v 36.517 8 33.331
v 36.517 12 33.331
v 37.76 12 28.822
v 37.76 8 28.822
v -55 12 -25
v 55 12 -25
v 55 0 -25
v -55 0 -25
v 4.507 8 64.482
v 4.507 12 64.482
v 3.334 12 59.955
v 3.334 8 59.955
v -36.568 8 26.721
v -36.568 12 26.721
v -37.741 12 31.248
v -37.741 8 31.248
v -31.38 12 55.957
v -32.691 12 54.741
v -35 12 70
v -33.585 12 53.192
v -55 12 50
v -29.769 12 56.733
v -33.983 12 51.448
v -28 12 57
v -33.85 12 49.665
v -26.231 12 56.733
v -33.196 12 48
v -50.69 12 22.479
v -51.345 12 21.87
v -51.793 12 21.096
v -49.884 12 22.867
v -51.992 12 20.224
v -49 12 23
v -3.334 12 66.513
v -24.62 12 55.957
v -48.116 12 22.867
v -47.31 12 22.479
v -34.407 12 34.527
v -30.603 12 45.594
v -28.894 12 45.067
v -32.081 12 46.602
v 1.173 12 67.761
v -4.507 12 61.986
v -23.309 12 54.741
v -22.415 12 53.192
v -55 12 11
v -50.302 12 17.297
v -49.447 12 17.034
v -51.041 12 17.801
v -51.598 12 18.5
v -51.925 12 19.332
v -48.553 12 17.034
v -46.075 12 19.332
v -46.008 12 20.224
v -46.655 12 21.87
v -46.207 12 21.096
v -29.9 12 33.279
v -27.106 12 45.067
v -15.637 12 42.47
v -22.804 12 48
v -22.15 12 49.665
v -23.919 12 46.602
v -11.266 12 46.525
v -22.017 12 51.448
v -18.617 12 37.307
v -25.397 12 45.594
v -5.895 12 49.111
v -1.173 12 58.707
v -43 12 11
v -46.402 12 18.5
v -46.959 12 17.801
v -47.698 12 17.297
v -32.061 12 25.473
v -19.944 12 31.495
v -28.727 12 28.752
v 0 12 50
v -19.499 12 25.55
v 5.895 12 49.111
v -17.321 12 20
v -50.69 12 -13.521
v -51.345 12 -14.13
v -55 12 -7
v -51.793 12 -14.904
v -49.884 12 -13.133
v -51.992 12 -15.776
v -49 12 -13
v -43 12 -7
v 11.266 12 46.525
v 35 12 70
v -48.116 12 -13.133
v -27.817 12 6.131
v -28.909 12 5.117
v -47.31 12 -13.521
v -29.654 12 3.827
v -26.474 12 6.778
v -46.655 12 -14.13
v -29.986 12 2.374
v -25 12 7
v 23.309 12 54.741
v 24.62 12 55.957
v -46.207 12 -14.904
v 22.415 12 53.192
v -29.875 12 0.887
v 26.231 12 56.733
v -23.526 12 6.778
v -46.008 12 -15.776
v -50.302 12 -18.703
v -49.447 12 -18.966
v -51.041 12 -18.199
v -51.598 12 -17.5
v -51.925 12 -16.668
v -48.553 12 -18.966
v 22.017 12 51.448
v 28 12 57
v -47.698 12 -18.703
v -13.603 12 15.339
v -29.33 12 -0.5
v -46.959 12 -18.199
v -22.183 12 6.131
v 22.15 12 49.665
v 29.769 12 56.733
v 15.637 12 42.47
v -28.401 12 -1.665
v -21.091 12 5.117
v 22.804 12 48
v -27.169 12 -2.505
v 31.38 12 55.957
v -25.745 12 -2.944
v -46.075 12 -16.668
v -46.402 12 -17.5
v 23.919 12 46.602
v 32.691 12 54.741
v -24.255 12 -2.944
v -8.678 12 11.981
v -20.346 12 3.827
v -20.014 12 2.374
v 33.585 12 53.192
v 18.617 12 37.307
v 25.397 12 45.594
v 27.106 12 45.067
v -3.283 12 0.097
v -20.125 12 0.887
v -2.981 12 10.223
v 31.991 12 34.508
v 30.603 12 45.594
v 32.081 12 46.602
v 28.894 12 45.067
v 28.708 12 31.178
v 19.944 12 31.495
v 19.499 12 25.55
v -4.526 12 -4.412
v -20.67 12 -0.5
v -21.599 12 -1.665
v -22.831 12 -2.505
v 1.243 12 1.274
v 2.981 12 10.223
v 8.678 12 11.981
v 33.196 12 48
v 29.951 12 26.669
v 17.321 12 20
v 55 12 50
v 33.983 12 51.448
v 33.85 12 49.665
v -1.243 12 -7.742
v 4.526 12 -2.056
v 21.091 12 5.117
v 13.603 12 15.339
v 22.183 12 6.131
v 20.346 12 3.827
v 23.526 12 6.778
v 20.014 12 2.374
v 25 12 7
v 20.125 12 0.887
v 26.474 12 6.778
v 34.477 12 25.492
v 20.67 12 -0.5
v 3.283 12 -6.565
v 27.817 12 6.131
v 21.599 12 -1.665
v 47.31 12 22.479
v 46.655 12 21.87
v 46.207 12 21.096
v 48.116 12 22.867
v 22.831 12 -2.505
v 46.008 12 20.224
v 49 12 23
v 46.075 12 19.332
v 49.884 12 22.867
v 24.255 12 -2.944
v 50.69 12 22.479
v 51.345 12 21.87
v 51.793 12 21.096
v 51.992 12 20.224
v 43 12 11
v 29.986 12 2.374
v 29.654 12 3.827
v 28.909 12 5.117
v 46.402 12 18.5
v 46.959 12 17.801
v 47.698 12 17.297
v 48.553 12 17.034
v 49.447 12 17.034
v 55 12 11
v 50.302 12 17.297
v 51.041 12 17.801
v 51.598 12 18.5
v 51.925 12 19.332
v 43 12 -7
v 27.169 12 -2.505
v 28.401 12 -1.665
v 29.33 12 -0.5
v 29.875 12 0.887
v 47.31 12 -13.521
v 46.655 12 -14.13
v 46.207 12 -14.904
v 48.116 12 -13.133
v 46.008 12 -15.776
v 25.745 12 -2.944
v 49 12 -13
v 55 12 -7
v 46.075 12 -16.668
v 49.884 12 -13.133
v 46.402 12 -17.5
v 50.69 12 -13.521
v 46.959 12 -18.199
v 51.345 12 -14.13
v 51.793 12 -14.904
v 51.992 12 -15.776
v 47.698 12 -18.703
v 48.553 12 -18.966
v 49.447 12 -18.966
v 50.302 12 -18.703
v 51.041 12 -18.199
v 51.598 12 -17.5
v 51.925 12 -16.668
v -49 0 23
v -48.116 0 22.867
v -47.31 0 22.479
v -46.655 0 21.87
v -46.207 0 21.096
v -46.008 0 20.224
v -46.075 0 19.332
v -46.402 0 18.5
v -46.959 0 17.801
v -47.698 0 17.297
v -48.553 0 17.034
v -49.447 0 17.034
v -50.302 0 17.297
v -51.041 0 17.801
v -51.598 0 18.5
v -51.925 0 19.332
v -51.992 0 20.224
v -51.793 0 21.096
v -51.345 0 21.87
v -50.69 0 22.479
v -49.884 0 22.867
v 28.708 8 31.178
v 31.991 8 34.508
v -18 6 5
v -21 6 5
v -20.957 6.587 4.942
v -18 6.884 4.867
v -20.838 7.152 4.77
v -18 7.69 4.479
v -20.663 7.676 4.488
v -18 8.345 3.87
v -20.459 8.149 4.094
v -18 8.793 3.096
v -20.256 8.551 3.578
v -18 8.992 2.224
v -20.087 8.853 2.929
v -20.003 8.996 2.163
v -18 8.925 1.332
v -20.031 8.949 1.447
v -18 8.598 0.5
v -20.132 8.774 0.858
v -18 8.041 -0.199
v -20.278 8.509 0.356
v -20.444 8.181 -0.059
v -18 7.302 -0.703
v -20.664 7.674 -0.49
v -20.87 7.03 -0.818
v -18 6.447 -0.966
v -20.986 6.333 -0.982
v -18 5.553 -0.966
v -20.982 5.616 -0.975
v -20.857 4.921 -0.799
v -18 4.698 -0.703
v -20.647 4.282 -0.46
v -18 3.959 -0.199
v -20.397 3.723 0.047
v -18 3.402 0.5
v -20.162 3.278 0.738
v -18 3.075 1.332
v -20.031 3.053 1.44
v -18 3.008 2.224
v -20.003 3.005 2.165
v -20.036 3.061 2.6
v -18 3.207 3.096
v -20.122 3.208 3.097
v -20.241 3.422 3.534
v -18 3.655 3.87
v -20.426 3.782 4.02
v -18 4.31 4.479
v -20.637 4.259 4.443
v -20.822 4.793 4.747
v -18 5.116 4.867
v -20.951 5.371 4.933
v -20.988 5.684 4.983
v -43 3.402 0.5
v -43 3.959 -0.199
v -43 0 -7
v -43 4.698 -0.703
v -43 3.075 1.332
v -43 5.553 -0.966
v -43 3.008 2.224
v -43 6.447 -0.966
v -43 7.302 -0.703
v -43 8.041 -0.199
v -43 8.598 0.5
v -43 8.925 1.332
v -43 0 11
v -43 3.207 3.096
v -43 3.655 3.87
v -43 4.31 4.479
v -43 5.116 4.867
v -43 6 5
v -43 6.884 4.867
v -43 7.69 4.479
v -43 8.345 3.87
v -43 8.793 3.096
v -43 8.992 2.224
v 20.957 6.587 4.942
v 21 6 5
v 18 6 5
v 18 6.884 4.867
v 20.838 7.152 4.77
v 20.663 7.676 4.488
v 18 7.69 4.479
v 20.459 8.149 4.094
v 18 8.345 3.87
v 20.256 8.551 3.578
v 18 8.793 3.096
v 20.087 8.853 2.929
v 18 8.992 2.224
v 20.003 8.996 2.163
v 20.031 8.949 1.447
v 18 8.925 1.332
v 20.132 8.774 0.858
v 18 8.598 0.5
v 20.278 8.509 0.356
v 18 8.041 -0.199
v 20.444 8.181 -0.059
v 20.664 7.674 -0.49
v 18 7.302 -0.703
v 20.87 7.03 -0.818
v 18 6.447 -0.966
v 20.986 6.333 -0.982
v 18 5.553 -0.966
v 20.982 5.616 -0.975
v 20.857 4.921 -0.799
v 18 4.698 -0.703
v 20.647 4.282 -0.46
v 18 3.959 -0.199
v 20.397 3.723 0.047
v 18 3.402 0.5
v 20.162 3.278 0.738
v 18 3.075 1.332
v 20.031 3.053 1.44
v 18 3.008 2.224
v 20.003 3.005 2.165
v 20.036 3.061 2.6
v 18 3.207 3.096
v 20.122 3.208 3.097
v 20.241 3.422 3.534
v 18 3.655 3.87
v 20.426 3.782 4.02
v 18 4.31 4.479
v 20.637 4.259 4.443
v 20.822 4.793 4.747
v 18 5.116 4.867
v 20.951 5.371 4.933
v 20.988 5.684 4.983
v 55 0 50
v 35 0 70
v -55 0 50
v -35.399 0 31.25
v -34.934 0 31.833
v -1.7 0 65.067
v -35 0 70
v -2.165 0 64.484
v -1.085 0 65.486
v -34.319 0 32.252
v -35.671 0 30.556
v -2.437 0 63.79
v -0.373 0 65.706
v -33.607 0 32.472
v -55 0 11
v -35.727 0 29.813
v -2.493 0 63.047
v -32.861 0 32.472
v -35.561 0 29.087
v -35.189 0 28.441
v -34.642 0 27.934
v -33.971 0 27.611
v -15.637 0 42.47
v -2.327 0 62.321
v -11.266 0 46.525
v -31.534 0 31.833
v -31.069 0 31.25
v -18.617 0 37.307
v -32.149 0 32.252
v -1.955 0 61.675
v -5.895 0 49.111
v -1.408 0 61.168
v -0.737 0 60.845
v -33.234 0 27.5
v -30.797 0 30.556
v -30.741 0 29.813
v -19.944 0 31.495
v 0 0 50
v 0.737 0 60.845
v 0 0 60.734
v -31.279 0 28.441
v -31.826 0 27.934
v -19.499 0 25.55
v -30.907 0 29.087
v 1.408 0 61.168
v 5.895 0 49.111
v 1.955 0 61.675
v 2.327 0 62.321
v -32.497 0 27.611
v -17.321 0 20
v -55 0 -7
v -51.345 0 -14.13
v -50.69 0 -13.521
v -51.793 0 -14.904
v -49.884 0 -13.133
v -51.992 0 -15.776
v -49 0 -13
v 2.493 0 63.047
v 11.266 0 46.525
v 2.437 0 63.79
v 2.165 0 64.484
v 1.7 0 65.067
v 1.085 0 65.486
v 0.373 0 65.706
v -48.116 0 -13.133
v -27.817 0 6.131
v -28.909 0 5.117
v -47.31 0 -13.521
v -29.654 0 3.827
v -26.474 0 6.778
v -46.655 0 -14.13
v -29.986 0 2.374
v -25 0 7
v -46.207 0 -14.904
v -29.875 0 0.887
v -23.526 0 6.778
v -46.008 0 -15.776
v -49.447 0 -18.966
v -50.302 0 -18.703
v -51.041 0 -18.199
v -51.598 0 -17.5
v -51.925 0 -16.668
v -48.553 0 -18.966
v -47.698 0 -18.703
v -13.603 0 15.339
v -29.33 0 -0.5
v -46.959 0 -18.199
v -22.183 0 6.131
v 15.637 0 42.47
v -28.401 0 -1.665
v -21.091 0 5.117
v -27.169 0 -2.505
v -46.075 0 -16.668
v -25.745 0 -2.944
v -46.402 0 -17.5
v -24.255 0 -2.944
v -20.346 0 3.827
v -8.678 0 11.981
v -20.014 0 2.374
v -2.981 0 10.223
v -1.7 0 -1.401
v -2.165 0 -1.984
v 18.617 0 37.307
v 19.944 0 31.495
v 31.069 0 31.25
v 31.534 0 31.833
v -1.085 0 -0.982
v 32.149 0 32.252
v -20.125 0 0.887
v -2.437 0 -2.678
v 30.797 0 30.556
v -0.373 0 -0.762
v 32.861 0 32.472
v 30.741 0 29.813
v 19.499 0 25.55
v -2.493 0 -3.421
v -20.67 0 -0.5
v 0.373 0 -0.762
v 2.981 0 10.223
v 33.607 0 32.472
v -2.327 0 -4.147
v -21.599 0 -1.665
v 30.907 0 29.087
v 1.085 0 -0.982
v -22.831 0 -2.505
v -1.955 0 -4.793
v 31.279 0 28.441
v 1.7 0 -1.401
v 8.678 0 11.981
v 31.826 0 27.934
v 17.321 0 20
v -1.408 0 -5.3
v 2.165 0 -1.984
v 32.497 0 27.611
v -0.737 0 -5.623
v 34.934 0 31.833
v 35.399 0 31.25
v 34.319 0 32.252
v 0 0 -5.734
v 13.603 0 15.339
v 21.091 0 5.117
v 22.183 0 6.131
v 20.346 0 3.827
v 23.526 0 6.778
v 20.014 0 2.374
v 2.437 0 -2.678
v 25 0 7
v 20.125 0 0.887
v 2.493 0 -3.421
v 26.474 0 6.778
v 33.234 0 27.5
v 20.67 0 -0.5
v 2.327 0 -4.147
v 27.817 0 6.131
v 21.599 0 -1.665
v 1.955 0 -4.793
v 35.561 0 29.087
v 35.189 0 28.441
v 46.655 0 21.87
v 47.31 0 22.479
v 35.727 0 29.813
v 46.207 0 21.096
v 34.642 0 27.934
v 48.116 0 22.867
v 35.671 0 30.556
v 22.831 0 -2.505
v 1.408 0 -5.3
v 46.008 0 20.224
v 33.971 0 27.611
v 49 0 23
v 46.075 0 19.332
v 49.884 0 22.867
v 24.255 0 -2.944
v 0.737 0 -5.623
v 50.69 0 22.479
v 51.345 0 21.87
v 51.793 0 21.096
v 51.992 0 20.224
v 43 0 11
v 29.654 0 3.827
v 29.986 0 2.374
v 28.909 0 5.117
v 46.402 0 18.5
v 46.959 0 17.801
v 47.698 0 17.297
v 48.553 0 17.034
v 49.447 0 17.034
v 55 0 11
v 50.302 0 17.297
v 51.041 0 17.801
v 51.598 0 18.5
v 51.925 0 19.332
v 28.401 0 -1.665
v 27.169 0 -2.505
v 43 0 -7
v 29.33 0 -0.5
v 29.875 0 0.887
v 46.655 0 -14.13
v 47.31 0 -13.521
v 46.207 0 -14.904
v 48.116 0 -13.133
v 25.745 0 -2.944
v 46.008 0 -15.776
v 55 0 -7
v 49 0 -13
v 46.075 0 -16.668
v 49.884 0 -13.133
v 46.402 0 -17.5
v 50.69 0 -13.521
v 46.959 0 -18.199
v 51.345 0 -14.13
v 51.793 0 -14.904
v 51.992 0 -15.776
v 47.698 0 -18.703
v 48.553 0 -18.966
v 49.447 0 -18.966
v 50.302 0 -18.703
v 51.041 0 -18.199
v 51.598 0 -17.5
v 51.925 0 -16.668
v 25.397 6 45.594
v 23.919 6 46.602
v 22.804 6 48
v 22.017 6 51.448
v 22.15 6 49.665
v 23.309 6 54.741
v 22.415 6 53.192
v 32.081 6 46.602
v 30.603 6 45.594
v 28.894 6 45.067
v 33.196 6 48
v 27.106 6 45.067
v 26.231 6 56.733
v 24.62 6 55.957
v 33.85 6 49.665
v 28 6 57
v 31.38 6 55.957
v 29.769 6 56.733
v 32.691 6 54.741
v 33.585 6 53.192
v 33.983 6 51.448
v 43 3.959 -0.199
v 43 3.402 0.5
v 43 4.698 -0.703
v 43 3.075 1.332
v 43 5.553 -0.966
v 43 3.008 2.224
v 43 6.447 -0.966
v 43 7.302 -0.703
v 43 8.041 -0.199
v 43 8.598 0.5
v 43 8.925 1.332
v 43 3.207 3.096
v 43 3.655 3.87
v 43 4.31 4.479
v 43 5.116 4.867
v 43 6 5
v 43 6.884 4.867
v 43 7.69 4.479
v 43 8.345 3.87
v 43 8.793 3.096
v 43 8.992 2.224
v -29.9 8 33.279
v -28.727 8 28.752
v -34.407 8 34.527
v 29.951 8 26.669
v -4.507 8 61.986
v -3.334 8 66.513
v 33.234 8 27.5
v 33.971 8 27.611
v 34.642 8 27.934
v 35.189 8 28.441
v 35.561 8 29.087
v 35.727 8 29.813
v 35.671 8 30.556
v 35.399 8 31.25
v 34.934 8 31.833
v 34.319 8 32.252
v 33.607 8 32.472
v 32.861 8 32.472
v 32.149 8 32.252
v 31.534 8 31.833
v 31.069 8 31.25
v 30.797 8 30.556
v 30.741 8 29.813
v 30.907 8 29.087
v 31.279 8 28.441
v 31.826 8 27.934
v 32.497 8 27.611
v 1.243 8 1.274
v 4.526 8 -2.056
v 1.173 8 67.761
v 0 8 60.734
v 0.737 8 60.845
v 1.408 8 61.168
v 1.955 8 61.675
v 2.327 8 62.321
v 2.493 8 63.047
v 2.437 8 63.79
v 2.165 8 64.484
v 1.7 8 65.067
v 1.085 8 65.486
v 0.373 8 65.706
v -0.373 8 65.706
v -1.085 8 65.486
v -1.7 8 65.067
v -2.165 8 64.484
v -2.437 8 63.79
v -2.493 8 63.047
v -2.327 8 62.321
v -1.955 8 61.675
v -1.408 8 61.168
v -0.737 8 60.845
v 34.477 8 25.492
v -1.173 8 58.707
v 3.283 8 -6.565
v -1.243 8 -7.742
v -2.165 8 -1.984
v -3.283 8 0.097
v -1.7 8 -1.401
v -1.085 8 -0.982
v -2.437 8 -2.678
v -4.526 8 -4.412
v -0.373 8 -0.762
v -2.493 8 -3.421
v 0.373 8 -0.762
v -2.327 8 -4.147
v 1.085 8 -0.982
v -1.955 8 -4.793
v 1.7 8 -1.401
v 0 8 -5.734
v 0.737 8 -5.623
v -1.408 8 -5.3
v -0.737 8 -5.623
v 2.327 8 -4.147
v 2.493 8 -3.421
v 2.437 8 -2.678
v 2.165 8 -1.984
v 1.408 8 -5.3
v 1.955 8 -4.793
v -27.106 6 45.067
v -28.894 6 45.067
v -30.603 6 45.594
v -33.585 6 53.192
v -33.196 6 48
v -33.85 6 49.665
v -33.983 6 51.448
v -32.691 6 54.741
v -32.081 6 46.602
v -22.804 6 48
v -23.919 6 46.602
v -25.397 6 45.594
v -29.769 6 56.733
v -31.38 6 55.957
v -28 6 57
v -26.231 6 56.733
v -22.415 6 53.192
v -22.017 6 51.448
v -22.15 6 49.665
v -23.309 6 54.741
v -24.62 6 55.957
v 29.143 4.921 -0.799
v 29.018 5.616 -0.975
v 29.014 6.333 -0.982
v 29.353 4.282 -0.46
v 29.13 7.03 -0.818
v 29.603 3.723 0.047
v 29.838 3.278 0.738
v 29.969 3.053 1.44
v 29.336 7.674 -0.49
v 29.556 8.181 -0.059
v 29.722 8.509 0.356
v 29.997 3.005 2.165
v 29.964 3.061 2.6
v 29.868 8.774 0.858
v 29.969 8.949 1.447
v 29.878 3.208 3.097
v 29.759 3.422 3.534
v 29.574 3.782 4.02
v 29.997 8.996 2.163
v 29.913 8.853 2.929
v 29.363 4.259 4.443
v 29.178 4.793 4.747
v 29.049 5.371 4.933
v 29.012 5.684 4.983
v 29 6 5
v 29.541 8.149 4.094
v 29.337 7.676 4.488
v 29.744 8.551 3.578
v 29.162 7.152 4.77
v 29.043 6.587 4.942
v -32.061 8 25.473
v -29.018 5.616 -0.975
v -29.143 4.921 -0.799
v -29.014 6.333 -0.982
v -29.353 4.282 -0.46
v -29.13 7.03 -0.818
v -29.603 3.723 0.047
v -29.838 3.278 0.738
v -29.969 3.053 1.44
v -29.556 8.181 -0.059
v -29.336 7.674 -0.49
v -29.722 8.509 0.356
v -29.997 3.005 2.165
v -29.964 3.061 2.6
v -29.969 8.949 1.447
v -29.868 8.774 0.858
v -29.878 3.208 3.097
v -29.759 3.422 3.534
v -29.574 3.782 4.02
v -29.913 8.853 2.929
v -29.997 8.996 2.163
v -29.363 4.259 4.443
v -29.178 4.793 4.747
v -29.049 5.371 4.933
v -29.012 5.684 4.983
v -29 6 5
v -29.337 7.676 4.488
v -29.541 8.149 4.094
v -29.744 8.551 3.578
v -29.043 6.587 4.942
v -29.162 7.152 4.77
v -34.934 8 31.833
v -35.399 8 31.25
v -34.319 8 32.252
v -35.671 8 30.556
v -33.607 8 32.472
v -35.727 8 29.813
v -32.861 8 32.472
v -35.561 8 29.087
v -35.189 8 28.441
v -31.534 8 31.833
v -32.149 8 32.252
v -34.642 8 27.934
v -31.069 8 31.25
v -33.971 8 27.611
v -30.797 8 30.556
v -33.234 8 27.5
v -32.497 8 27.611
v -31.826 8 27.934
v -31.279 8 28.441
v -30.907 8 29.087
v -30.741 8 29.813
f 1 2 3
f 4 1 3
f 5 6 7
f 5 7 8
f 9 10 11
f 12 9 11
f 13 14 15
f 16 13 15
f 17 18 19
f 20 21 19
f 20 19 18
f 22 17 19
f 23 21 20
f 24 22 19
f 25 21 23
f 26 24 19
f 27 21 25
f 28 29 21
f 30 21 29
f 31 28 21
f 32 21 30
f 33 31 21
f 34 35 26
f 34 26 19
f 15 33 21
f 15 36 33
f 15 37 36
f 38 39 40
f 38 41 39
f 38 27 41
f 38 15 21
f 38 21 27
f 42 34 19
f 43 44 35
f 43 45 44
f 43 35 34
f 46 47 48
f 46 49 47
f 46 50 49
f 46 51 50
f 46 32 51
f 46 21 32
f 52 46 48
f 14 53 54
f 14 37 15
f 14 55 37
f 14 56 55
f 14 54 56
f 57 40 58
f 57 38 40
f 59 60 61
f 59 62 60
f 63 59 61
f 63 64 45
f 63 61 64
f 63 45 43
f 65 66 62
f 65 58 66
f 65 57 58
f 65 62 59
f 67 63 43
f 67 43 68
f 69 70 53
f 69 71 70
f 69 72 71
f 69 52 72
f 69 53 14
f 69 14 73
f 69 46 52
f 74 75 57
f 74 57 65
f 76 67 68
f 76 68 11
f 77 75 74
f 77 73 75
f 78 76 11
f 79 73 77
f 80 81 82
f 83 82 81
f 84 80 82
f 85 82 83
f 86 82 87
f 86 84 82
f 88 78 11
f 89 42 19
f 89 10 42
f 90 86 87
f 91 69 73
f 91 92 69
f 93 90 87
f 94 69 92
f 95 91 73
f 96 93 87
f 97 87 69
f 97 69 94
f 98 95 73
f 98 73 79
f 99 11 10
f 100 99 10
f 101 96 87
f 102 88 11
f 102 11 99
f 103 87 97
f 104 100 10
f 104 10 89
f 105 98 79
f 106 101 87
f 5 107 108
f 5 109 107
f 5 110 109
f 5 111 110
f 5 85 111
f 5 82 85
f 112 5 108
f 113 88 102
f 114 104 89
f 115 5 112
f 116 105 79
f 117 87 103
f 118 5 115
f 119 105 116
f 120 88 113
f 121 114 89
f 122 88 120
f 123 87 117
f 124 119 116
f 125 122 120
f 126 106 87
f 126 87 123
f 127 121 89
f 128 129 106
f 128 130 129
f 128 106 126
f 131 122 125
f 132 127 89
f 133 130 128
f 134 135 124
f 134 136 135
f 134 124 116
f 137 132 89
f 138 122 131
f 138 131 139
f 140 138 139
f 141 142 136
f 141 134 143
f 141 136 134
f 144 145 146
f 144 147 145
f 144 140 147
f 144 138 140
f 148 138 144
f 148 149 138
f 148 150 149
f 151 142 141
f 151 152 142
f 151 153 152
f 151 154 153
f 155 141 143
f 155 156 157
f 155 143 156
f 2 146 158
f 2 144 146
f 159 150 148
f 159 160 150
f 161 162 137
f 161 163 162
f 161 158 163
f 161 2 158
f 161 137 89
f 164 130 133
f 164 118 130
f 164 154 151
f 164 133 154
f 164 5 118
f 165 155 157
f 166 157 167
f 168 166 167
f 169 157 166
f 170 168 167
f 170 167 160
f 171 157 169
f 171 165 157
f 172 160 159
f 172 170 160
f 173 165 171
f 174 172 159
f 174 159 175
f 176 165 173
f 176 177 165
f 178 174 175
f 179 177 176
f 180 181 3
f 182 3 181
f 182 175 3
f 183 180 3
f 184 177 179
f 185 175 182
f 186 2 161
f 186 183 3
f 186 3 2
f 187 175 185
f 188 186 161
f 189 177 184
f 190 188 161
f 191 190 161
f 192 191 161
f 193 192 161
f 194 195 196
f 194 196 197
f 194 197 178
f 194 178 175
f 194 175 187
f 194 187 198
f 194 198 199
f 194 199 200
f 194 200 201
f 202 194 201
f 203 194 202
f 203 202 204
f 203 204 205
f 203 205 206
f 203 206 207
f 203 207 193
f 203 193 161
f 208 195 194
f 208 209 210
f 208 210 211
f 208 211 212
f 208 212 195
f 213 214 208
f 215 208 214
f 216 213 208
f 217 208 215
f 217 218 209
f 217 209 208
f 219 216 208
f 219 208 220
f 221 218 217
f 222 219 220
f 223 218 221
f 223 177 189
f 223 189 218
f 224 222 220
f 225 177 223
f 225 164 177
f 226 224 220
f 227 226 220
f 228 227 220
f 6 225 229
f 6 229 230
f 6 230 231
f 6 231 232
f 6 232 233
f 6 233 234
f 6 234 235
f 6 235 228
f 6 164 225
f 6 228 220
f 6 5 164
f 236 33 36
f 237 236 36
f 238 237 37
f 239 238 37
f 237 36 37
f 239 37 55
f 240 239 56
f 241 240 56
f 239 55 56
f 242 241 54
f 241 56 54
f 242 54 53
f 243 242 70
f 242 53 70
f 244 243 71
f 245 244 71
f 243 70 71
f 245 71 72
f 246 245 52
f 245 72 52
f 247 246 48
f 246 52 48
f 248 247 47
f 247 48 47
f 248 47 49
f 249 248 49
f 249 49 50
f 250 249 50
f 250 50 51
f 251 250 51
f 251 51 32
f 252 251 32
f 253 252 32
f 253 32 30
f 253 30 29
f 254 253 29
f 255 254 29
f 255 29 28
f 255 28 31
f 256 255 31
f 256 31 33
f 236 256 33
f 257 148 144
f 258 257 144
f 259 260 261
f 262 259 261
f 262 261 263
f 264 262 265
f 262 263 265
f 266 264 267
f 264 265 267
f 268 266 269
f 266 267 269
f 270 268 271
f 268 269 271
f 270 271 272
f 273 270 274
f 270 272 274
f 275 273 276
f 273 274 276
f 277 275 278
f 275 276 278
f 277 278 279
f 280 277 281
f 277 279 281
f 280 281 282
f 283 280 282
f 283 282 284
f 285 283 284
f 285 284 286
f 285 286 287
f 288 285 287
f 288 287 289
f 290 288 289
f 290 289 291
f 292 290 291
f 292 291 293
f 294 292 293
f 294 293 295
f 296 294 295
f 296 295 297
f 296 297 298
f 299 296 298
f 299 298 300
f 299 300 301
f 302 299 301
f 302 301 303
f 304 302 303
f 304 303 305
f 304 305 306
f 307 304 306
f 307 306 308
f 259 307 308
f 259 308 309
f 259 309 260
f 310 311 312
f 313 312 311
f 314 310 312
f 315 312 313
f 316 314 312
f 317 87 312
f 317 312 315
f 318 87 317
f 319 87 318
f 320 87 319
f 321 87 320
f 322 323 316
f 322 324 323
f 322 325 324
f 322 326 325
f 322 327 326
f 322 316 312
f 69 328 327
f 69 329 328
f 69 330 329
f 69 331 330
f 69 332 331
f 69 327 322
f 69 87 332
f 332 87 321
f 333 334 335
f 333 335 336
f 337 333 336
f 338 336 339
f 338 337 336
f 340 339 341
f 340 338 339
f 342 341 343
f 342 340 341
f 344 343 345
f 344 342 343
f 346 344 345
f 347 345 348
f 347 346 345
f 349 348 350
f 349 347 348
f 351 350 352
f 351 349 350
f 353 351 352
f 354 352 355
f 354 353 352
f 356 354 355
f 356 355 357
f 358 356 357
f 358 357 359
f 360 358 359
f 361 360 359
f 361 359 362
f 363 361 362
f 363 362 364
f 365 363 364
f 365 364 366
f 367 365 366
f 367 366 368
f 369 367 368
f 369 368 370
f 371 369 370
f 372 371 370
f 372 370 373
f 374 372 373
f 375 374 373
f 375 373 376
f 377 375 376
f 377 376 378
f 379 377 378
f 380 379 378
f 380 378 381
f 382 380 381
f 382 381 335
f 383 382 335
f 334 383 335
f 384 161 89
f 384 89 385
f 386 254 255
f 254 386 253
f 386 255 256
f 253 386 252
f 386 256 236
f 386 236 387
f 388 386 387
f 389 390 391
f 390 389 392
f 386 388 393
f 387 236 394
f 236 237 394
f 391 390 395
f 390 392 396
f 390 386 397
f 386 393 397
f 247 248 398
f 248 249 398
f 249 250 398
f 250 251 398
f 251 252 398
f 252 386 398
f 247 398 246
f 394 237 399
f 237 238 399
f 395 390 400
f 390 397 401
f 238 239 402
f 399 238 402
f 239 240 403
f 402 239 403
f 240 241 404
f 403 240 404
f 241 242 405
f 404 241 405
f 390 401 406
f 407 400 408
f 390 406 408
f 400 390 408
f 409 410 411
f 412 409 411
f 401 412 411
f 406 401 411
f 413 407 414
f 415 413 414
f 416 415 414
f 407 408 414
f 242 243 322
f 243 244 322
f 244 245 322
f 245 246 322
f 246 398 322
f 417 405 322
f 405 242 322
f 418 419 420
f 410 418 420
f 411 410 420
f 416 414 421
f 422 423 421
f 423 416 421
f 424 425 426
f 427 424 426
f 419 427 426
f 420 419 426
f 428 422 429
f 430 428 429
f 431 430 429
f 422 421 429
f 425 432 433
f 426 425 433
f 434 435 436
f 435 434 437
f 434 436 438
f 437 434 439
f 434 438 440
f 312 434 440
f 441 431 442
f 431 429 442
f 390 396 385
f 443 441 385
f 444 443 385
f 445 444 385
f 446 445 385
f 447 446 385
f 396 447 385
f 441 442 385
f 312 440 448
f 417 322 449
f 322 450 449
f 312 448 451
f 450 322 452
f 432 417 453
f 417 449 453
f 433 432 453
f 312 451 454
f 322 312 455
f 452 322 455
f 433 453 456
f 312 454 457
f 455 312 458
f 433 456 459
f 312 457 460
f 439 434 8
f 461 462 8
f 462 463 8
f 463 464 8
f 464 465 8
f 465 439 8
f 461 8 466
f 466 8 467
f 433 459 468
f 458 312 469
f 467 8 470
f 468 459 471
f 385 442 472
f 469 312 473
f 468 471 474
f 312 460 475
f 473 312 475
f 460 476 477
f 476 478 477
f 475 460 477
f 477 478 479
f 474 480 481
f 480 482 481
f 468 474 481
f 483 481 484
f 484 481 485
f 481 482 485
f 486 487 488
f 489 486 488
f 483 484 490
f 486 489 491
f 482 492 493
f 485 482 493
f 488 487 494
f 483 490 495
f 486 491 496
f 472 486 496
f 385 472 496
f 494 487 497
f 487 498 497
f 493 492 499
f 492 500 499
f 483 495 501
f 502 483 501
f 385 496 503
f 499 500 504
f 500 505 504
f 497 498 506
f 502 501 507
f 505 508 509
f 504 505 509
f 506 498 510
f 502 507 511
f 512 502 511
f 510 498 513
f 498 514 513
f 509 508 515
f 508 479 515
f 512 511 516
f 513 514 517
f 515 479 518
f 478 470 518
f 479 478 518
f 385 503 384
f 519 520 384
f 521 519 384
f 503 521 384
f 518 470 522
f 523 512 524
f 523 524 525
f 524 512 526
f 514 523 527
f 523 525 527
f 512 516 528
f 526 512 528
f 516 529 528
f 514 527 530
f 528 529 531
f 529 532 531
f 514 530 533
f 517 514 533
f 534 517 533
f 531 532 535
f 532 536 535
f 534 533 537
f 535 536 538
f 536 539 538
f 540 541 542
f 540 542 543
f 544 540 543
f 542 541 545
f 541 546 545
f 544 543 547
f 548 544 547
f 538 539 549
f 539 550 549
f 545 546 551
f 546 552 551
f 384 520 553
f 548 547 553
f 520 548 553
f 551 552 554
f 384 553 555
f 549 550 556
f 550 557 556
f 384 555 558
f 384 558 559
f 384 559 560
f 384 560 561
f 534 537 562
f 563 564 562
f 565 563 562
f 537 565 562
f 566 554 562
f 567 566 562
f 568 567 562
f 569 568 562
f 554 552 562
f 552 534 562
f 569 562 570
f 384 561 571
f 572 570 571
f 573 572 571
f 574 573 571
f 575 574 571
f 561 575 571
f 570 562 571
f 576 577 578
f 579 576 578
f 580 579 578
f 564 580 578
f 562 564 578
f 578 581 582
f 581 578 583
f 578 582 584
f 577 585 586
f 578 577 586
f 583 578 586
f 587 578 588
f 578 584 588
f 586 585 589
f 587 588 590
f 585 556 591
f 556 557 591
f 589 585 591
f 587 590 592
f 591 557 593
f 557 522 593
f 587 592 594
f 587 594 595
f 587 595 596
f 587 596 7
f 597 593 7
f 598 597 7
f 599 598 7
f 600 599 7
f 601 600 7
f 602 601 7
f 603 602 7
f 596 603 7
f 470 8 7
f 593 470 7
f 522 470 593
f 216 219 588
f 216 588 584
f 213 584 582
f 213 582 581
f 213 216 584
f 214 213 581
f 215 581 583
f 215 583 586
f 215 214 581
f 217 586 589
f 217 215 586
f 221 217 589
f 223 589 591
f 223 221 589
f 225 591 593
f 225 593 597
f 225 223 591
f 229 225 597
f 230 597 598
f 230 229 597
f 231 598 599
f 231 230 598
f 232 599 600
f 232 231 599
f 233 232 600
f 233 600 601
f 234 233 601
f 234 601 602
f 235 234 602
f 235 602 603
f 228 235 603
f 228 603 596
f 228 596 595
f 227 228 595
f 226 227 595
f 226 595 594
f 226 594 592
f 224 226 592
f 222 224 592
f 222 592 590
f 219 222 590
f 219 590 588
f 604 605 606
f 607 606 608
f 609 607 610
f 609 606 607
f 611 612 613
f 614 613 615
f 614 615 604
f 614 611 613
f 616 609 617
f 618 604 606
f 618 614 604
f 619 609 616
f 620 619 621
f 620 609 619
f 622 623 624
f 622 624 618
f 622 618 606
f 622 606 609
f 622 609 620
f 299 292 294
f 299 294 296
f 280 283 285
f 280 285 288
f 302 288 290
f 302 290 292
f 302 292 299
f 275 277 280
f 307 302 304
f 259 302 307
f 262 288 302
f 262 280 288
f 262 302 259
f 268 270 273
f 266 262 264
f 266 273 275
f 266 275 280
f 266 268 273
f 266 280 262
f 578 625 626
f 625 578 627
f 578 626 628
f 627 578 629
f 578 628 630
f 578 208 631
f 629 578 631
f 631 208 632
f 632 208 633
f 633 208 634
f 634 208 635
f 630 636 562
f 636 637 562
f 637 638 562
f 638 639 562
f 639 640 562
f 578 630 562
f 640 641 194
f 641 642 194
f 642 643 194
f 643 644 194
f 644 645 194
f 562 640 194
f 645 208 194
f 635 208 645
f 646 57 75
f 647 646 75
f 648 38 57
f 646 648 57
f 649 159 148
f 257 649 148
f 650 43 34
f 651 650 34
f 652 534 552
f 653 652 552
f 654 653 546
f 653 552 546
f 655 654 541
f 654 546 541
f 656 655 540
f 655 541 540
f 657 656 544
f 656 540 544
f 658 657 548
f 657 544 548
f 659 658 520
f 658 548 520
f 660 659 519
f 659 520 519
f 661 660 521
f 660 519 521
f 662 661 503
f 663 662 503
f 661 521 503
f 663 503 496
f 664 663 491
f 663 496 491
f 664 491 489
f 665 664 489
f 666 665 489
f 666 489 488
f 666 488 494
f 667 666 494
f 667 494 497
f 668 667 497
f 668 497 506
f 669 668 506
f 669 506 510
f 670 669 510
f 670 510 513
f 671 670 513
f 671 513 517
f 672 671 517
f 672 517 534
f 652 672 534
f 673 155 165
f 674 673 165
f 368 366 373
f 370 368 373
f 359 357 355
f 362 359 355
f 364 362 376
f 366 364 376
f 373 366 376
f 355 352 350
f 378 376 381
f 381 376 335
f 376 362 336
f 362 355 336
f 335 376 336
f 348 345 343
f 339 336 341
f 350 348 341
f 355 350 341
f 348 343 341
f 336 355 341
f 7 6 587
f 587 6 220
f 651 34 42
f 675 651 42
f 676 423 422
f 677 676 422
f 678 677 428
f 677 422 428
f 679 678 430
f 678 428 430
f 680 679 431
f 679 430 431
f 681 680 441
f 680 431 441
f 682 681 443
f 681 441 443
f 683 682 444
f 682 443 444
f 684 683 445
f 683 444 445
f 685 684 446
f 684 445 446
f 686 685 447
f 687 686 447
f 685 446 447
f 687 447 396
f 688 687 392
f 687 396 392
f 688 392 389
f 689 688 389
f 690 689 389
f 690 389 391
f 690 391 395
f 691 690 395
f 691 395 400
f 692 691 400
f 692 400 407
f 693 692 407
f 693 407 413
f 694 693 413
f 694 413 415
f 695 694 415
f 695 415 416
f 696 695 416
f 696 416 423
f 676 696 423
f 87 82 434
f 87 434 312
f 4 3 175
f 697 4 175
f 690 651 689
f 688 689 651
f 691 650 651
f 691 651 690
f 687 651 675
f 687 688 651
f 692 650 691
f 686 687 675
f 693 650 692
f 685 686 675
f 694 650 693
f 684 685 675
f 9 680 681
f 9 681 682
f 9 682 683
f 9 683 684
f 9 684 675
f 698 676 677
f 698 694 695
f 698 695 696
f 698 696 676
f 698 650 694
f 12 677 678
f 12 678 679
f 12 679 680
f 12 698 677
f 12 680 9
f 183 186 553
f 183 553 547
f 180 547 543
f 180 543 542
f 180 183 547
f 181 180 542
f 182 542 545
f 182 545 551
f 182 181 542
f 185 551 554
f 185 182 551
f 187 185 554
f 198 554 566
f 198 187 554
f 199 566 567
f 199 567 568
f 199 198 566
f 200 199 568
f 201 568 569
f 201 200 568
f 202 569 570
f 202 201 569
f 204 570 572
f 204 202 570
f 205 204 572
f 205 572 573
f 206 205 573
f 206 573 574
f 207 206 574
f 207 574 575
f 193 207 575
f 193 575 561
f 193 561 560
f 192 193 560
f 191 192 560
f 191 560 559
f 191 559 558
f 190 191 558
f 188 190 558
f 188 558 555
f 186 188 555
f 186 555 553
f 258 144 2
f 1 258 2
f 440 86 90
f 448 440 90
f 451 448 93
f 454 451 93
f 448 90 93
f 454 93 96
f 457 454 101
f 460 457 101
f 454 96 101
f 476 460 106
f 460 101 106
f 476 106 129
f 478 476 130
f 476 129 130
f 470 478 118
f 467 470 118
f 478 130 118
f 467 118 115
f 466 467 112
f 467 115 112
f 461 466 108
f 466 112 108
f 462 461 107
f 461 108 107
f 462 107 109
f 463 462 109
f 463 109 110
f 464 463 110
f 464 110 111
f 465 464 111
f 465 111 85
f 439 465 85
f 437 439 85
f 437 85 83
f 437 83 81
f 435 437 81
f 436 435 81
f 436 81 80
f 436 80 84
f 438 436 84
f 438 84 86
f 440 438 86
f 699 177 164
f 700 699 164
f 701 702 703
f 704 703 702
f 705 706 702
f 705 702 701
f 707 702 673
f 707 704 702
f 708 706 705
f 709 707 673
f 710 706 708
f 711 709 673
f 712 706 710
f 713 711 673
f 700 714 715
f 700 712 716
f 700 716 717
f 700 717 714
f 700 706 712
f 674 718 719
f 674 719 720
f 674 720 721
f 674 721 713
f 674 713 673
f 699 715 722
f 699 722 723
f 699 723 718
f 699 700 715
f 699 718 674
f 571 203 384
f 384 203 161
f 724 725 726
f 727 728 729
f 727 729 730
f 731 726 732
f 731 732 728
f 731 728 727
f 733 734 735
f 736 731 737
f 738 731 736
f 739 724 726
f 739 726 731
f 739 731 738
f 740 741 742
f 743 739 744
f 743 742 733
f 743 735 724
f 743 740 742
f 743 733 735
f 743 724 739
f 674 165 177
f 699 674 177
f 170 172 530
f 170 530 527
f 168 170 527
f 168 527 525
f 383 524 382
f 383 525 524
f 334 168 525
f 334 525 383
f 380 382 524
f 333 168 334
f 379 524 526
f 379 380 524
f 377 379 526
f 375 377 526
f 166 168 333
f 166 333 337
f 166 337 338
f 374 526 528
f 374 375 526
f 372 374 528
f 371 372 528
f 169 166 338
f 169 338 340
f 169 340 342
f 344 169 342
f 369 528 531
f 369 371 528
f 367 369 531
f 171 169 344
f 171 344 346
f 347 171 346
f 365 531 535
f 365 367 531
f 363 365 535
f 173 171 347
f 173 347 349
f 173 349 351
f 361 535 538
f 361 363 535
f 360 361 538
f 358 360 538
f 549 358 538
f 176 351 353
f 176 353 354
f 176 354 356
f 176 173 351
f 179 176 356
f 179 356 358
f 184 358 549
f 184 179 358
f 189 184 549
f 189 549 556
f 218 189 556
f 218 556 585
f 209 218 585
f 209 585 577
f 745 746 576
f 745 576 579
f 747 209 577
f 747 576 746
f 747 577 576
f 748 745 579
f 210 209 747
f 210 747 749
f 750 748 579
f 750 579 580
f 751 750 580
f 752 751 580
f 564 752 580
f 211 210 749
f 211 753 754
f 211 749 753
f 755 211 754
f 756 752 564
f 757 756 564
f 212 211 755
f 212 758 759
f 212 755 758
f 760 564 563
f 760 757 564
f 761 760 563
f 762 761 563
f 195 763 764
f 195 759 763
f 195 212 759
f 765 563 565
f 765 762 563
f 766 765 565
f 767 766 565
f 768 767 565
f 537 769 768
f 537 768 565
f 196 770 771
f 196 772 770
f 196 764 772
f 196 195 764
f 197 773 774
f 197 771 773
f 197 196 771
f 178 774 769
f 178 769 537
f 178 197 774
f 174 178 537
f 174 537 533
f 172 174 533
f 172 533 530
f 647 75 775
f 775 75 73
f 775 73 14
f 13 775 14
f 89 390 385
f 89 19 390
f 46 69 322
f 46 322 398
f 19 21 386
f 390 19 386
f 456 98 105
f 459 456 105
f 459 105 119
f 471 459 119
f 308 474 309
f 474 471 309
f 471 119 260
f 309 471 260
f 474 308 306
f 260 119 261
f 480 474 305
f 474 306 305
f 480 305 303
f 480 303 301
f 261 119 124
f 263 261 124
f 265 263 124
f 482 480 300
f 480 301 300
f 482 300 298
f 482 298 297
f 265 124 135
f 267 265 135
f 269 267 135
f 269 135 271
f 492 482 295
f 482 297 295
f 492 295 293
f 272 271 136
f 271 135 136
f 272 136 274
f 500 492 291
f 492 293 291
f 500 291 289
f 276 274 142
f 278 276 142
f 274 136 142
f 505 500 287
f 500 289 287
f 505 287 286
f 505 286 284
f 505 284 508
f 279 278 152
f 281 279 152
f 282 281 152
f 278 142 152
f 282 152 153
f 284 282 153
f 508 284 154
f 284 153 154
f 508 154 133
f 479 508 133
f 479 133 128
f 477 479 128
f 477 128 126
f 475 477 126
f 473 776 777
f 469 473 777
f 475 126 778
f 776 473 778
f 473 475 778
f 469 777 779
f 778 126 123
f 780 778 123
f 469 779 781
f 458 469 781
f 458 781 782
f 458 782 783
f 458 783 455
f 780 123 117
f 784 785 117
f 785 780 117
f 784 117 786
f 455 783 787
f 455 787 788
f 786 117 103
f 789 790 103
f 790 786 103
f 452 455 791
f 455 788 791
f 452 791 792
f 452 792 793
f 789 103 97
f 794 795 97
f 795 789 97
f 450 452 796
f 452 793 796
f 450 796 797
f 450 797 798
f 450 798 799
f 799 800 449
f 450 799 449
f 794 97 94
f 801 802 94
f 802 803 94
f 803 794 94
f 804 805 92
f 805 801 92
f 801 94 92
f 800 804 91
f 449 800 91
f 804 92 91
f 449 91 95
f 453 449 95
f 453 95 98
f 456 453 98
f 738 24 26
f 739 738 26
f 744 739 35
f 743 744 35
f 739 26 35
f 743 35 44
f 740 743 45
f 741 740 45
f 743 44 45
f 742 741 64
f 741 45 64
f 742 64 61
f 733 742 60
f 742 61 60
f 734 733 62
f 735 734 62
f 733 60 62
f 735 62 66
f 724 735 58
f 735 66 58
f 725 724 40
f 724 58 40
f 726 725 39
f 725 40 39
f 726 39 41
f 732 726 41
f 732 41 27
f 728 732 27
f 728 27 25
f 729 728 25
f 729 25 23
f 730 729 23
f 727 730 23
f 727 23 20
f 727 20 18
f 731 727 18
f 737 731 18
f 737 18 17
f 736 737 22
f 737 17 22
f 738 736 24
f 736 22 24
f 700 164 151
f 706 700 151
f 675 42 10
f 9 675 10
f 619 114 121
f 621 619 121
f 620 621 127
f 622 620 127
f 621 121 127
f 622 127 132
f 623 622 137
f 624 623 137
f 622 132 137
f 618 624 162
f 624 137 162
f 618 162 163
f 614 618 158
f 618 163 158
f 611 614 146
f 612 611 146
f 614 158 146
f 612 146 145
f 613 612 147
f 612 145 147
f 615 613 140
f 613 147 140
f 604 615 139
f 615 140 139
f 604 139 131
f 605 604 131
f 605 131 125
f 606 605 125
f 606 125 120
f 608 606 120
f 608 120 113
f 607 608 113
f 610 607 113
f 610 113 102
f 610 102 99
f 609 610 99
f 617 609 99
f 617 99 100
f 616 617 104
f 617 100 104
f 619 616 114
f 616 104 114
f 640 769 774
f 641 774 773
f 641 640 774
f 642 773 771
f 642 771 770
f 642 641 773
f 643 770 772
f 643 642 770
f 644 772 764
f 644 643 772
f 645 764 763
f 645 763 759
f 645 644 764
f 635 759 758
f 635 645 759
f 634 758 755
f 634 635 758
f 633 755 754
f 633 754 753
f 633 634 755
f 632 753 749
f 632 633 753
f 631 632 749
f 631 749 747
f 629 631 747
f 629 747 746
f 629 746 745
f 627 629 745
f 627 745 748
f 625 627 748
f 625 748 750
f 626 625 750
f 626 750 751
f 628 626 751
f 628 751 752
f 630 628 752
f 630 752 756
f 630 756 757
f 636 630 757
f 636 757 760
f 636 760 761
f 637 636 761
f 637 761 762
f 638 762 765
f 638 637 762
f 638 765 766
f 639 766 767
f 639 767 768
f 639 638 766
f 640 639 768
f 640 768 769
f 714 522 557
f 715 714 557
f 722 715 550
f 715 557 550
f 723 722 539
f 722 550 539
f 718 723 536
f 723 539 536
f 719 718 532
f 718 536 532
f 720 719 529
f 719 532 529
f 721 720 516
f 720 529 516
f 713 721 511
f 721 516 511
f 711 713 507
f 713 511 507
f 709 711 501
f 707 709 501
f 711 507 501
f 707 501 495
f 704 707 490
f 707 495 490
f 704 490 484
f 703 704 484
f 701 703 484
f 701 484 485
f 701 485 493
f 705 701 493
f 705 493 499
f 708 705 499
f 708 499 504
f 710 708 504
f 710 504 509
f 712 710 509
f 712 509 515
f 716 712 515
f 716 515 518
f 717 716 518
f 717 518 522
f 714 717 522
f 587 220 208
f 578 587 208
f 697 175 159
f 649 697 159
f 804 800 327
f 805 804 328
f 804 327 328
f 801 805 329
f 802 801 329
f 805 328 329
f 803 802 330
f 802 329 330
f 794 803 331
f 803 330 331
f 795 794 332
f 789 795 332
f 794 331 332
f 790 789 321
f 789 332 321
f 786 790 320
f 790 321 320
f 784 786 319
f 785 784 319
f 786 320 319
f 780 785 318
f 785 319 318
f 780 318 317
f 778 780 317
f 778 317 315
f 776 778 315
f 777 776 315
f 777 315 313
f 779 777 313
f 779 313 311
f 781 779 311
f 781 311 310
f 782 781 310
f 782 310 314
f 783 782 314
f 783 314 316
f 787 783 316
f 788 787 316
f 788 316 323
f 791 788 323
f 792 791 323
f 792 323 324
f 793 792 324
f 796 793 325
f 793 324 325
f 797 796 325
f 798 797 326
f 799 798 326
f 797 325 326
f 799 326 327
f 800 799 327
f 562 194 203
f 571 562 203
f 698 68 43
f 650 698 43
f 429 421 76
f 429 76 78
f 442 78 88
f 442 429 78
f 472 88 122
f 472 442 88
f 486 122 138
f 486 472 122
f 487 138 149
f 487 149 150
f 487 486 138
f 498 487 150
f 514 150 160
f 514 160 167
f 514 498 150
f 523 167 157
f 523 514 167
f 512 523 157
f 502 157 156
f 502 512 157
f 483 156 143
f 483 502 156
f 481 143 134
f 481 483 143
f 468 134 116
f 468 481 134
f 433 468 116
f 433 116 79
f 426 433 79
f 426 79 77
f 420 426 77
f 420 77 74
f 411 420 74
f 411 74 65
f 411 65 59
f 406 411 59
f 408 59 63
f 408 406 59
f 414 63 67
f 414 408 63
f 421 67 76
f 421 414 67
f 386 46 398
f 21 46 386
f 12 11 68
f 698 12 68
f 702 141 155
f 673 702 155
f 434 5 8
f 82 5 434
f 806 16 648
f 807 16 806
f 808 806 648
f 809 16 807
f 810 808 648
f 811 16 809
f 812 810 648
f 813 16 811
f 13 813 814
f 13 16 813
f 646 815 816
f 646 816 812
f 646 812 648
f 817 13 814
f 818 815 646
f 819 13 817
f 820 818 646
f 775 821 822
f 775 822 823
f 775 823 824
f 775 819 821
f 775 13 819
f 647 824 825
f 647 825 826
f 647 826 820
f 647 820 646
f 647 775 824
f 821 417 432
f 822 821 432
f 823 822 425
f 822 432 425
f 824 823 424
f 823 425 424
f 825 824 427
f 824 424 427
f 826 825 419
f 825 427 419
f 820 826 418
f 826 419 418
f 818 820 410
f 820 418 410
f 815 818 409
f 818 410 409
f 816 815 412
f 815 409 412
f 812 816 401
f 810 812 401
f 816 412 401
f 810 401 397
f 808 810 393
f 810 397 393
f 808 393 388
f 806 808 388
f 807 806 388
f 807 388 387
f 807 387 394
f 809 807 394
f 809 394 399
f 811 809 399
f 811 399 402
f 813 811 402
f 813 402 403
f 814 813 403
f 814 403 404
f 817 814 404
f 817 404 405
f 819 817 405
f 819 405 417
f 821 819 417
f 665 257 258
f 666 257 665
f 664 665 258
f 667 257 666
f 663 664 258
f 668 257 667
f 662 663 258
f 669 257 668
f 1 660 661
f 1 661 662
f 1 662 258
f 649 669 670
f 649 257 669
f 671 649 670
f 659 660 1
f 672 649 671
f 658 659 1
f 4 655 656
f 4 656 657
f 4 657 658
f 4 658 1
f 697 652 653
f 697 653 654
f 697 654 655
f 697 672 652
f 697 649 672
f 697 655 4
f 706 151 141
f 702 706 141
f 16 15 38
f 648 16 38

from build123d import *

# Parameters (mm, degrees)
SKETCH1_W           = 66
SKETCH1_H           = 95
SKETCH1_R           = 20
BOSS_EXTRUDE1_DEPTH = 12
BOSS_EXTRUDE3_DEPTH = 12
SKETCH6_R           = 6
CUT_EXTRUDE2_DEPTH  = 6
CHAMFER1_SIZE       = 20
CUT_EXTRUDE3_REACH  = 91.828
SKETCH7_R           = 3
SKETCH7_R_2         = 5
SKETCH9_R           = 3
CUT_EXTRUDE5_DEPTH  = 25
CUT_EXTRUDE6_REACH  = 91.828
SKETCH10_R          = 2.5
CUT_EXTRUDE7_DEPTH  = 4


with BuildPart() as part:
    # Sketch1 → Boss-Extrude1 (new body)
    with BuildSketch(Plane(origin=(0, 0, 0), x_dir=(1, 0, 0), z_dir=(0, 1, 0))):
        with Locations((0, -22.5)):
            Rectangle(SKETCH1_W, SKETCH1_H)
        with Locations(Location((0, -30, 0), (0, 0, 270))):
            Circle(SKETCH1_R, mode=Mode.SUBTRACT)
    extrude(amount=BOSS_EXTRUDE1_DEPTH)

    # Sketch3 → Boss-Extrude3 (add)
    with BuildSketch(Plane(origin=(0, 12, 0), x_dir=(1, 0, 0), z_dir=(0, 1, 0))):
        Polygon((55, 7), (43, 7), (43, -11), (55, -11), (55, -70), (33, -70), (33, 25), (55, 25), align=None)
    boss_extrude3 = extrude(amount=-BOSS_EXTRUDE3_DEPTH)

    # Mirror1: Boss-Extrude3 across plane
    add(boss_extrude3.mirror(Plane(origin=(0, 0, 0), x_dir=(0, 0, 1), z_dir=(1, 0, 0))))

    # Sketch6 → Cut-Extrude2 (cut)
    with BuildSketch(Plane(origin=(0, 12, 0), x_dir=(1, 0, 0), z_dir=(0, 1, 0))):
        with Locations(Location((-28, -51, 0), (0, 0, 270))):
            Circle(SKETCH6_R)
        with Locations(Location((28, -51, 0), (0, 0, 270))):
            Circle(SKETCH6_R)
    extrude(amount=-CUT_EXTRUDE2_DEPTH, mode=Mode.SUBTRACT)

    # Chamfer1
    chamfer1_edges = [part.edges().sort_by_distance(p)[0] for p in [
        (55, 6, 70),
        (-55, 6, 70),
    ]]
    chamfer(chamfer1_edges, length=CHAMFER1_SIZE)

    # Sketch7 → Cut-Extrude3 (cut, up to next)
    with BuildSketch(Plane(origin=(0, 12, 0), x_dir=(1, 0, 0), z_dir=(0, 1, 0)), mode=Mode.PRIVATE) as cut_extrude3_sk1:
        with Locations(Location((-49, 16, 0), (0, 0, 270))):
            Circle(SKETCH7_R)
    cut_extrude3_tool1 = extrude(cut_extrude3_sk1.sketch, amount=-CUT_EXTRUDE3_REACH, mode=Mode.PRIVATE) & part.part
    # Sketch7 → Cut-Extrude3 (cut, up to next)
    with BuildSketch(Plane(origin=(0, 12, 0), x_dir=(1, 0, 0), z_dir=(0, 1, 0)), mode=Mode.PRIVATE) as cut_extrude3_sk2:
        with Locations(Location((-49, -20, 0), (0, 0, 270))):
            Circle(SKETCH7_R)
    cut_extrude3_tool2 = extrude(cut_extrude3_sk2.sketch, amount=-CUT_EXTRUDE3_REACH, mode=Mode.PRIVATE) & part.part
    # Sketch7 → Cut-Extrude3 (cut, up to next)
    with BuildSketch(Plane(origin=(0, 12, 0), x_dir=(1, 0, 0), z_dir=(0, 1, 0)), mode=Mode.PRIVATE) as cut_extrude3_sk3:
        with Locations(Location((-25, -2, 0), (0, 0, 270))):
            Circle(SKETCH7_R_2)
    cut_extrude3_tool3 = extrude(cut_extrude3_sk3.sketch, amount=-CUT_EXTRUDE3_REACH, mode=Mode.PRIVATE) & part.part
    cut_extrude3_1 = cut_extrude3_tool1.solids().sort_by_distance((-49, 12, -16))[0]
    add(cut_extrude3_1, mode=Mode.SUBTRACT)
    cut_extrude3_2 = cut_extrude3_tool2.solids().sort_by_distance((-49, 12, 20))[0]
    add(cut_extrude3_2, mode=Mode.SUBTRACT)
    cut_extrude3_3 = cut_extrude3_tool3.solids().sort_by_distance((-25, 12, 2))[0]
    add(cut_extrude3_3, mode=Mode.SUBTRACT)
    cut_extrude3 = cut_extrude3_1 + cut_extrude3_2 + cut_extrude3_3  # Cut-Extrude3 as one shape, for the pattern or mirror that repeats it

    # Sketch9 → Cut-Extrude5 (cut)
    with BuildSketch(Plane.ZY.offset(43)):
        with Locations((2, 6)):
            Circle(SKETCH9_R)
    cut_extrude5 = extrude(amount=-CUT_EXTRUDE5_DEPTH, mode=Mode.SUBTRACT)

    # Mirror2: Cut-Extrude3, Cut-Extrude5 across plane
    add(cut_extrude3.mirror(Plane(origin=(0, 0, 0), x_dir=(0, 0, 1), z_dir=(1, 0, 0))), mode=Mode.SUBTRACT)
    add(cut_extrude5.mirror(Plane(origin=(0, 0, 0), x_dir=(0, 0, 1), z_dir=(1, 0, 0))), mode=Mode.SUBTRACT)

    # Sketch10 → Cut-Extrude6 (cut, up to next)
    with BuildSketch(Plane.XZ, mode=Mode.PRIVATE) as cut_extrude6_sk1:
        with Locations(Location((0, 63.234018716, 0), (0, 0, 270))):
            Circle(SKETCH10_R)
    cut_extrude6_tool1 = extrude(cut_extrude6_sk1.sketch, amount=-CUT_EXTRUDE6_REACH, mode=Mode.PRIVATE) & part.part
    # Sketch10 → Cut-Extrude6 (cut, up to next)
    with BuildSketch(Plane.XZ, mode=Mode.PRIVATE) as cut_extrude6_sk2:
        with Locations(Location((-33.234018716, 30, 0), (0, 0, 270))):
            Circle(SKETCH10_R)
    cut_extrude6_tool2 = extrude(cut_extrude6_sk2.sketch, amount=-CUT_EXTRUDE6_REACH, mode=Mode.PRIVATE) & part.part
    # Sketch10 → Cut-Extrude6 (cut, up to next)
    with BuildSketch(Plane.XZ, mode=Mode.PRIVATE) as cut_extrude6_sk3:
        with Locations(Location((0, -3.234018716, 0), (0, 0, 270))):
            Circle(SKETCH10_R)
    cut_extrude6_tool3 = extrude(cut_extrude6_sk3.sketch, amount=-CUT_EXTRUDE6_REACH, mode=Mode.PRIVATE) & part.part
    # Sketch10 → Cut-Extrude6 (cut, up to next)
    with BuildSketch(Plane.XZ, mode=Mode.PRIVATE) as cut_extrude6_sk4:
        with Locations(Location((33.234018716, 30, 0), (0, 0, 270))):
            Circle(SKETCH10_R)
    cut_extrude6_tool4 = extrude(cut_extrude6_sk4.sketch, amount=-CUT_EXTRUDE6_REACH, mode=Mode.PRIVATE) & part.part
    add(cut_extrude6_tool1.solids().sort_by_distance((0, 0, 63.234019))[0], mode=Mode.SUBTRACT)
    add(cut_extrude6_tool2.solids().sort_by_distance((-33.234019, 0, 30))[0], mode=Mode.SUBTRACT)
    add(cut_extrude6_tool3.solids().sort_by_distance((0, 0, -3.234019))[0], mode=Mode.SUBTRACT)
    add(cut_extrude6_tool4.solids().sort_by_distance((33.234019, 0, 30))[0], mode=Mode.SUBTRACT)

    # Sketch12 → Cut-Extrude7 (cut)
    with BuildSketch(Plane(origin=(0, 12, 0), x_dir=(1, 0, 0), z_dir=(0, 1, 0))):
        Polygon((3.334261142, -59.954887332), (-1.17268051, -58.706898172), (-4.506941652, -61.986029556), (-3.334261142, -66.5131501), (1.17268051, -67.76113926), (4.506941652, -64.482007876), align=None)
        Polygon((-29.899757573, -33.279131384), (-28.727077064, -28.75201084), (-32.061338206, -25.472879456), (-36.568279858, -26.720868616), (-37.740960368, -31.24798916), (-34.406699225, -34.527120544), align=None)
        Polygon((-3.282764492, -0.096665492), (1.24307489, -1.274280833), (4.525839382, 2.056403375), (3.282764492, 6.564702924), (-1.24307489, 7.742318264), (-4.525839382, 4.411634056), align=None)
        Polygon((29.951254224, -26.669315792), (28.708179334, -31.177615341), (31.990943826, -34.508299548), (36.516783208, -33.330684208), (37.759858098, -28.822384659), (34.477093606, -25.491700452), align=None)
    extrude(amount=-CUT_EXTRUDE7_DEPTH, mode=Mode.SUBTRACT)


solid = part.part
